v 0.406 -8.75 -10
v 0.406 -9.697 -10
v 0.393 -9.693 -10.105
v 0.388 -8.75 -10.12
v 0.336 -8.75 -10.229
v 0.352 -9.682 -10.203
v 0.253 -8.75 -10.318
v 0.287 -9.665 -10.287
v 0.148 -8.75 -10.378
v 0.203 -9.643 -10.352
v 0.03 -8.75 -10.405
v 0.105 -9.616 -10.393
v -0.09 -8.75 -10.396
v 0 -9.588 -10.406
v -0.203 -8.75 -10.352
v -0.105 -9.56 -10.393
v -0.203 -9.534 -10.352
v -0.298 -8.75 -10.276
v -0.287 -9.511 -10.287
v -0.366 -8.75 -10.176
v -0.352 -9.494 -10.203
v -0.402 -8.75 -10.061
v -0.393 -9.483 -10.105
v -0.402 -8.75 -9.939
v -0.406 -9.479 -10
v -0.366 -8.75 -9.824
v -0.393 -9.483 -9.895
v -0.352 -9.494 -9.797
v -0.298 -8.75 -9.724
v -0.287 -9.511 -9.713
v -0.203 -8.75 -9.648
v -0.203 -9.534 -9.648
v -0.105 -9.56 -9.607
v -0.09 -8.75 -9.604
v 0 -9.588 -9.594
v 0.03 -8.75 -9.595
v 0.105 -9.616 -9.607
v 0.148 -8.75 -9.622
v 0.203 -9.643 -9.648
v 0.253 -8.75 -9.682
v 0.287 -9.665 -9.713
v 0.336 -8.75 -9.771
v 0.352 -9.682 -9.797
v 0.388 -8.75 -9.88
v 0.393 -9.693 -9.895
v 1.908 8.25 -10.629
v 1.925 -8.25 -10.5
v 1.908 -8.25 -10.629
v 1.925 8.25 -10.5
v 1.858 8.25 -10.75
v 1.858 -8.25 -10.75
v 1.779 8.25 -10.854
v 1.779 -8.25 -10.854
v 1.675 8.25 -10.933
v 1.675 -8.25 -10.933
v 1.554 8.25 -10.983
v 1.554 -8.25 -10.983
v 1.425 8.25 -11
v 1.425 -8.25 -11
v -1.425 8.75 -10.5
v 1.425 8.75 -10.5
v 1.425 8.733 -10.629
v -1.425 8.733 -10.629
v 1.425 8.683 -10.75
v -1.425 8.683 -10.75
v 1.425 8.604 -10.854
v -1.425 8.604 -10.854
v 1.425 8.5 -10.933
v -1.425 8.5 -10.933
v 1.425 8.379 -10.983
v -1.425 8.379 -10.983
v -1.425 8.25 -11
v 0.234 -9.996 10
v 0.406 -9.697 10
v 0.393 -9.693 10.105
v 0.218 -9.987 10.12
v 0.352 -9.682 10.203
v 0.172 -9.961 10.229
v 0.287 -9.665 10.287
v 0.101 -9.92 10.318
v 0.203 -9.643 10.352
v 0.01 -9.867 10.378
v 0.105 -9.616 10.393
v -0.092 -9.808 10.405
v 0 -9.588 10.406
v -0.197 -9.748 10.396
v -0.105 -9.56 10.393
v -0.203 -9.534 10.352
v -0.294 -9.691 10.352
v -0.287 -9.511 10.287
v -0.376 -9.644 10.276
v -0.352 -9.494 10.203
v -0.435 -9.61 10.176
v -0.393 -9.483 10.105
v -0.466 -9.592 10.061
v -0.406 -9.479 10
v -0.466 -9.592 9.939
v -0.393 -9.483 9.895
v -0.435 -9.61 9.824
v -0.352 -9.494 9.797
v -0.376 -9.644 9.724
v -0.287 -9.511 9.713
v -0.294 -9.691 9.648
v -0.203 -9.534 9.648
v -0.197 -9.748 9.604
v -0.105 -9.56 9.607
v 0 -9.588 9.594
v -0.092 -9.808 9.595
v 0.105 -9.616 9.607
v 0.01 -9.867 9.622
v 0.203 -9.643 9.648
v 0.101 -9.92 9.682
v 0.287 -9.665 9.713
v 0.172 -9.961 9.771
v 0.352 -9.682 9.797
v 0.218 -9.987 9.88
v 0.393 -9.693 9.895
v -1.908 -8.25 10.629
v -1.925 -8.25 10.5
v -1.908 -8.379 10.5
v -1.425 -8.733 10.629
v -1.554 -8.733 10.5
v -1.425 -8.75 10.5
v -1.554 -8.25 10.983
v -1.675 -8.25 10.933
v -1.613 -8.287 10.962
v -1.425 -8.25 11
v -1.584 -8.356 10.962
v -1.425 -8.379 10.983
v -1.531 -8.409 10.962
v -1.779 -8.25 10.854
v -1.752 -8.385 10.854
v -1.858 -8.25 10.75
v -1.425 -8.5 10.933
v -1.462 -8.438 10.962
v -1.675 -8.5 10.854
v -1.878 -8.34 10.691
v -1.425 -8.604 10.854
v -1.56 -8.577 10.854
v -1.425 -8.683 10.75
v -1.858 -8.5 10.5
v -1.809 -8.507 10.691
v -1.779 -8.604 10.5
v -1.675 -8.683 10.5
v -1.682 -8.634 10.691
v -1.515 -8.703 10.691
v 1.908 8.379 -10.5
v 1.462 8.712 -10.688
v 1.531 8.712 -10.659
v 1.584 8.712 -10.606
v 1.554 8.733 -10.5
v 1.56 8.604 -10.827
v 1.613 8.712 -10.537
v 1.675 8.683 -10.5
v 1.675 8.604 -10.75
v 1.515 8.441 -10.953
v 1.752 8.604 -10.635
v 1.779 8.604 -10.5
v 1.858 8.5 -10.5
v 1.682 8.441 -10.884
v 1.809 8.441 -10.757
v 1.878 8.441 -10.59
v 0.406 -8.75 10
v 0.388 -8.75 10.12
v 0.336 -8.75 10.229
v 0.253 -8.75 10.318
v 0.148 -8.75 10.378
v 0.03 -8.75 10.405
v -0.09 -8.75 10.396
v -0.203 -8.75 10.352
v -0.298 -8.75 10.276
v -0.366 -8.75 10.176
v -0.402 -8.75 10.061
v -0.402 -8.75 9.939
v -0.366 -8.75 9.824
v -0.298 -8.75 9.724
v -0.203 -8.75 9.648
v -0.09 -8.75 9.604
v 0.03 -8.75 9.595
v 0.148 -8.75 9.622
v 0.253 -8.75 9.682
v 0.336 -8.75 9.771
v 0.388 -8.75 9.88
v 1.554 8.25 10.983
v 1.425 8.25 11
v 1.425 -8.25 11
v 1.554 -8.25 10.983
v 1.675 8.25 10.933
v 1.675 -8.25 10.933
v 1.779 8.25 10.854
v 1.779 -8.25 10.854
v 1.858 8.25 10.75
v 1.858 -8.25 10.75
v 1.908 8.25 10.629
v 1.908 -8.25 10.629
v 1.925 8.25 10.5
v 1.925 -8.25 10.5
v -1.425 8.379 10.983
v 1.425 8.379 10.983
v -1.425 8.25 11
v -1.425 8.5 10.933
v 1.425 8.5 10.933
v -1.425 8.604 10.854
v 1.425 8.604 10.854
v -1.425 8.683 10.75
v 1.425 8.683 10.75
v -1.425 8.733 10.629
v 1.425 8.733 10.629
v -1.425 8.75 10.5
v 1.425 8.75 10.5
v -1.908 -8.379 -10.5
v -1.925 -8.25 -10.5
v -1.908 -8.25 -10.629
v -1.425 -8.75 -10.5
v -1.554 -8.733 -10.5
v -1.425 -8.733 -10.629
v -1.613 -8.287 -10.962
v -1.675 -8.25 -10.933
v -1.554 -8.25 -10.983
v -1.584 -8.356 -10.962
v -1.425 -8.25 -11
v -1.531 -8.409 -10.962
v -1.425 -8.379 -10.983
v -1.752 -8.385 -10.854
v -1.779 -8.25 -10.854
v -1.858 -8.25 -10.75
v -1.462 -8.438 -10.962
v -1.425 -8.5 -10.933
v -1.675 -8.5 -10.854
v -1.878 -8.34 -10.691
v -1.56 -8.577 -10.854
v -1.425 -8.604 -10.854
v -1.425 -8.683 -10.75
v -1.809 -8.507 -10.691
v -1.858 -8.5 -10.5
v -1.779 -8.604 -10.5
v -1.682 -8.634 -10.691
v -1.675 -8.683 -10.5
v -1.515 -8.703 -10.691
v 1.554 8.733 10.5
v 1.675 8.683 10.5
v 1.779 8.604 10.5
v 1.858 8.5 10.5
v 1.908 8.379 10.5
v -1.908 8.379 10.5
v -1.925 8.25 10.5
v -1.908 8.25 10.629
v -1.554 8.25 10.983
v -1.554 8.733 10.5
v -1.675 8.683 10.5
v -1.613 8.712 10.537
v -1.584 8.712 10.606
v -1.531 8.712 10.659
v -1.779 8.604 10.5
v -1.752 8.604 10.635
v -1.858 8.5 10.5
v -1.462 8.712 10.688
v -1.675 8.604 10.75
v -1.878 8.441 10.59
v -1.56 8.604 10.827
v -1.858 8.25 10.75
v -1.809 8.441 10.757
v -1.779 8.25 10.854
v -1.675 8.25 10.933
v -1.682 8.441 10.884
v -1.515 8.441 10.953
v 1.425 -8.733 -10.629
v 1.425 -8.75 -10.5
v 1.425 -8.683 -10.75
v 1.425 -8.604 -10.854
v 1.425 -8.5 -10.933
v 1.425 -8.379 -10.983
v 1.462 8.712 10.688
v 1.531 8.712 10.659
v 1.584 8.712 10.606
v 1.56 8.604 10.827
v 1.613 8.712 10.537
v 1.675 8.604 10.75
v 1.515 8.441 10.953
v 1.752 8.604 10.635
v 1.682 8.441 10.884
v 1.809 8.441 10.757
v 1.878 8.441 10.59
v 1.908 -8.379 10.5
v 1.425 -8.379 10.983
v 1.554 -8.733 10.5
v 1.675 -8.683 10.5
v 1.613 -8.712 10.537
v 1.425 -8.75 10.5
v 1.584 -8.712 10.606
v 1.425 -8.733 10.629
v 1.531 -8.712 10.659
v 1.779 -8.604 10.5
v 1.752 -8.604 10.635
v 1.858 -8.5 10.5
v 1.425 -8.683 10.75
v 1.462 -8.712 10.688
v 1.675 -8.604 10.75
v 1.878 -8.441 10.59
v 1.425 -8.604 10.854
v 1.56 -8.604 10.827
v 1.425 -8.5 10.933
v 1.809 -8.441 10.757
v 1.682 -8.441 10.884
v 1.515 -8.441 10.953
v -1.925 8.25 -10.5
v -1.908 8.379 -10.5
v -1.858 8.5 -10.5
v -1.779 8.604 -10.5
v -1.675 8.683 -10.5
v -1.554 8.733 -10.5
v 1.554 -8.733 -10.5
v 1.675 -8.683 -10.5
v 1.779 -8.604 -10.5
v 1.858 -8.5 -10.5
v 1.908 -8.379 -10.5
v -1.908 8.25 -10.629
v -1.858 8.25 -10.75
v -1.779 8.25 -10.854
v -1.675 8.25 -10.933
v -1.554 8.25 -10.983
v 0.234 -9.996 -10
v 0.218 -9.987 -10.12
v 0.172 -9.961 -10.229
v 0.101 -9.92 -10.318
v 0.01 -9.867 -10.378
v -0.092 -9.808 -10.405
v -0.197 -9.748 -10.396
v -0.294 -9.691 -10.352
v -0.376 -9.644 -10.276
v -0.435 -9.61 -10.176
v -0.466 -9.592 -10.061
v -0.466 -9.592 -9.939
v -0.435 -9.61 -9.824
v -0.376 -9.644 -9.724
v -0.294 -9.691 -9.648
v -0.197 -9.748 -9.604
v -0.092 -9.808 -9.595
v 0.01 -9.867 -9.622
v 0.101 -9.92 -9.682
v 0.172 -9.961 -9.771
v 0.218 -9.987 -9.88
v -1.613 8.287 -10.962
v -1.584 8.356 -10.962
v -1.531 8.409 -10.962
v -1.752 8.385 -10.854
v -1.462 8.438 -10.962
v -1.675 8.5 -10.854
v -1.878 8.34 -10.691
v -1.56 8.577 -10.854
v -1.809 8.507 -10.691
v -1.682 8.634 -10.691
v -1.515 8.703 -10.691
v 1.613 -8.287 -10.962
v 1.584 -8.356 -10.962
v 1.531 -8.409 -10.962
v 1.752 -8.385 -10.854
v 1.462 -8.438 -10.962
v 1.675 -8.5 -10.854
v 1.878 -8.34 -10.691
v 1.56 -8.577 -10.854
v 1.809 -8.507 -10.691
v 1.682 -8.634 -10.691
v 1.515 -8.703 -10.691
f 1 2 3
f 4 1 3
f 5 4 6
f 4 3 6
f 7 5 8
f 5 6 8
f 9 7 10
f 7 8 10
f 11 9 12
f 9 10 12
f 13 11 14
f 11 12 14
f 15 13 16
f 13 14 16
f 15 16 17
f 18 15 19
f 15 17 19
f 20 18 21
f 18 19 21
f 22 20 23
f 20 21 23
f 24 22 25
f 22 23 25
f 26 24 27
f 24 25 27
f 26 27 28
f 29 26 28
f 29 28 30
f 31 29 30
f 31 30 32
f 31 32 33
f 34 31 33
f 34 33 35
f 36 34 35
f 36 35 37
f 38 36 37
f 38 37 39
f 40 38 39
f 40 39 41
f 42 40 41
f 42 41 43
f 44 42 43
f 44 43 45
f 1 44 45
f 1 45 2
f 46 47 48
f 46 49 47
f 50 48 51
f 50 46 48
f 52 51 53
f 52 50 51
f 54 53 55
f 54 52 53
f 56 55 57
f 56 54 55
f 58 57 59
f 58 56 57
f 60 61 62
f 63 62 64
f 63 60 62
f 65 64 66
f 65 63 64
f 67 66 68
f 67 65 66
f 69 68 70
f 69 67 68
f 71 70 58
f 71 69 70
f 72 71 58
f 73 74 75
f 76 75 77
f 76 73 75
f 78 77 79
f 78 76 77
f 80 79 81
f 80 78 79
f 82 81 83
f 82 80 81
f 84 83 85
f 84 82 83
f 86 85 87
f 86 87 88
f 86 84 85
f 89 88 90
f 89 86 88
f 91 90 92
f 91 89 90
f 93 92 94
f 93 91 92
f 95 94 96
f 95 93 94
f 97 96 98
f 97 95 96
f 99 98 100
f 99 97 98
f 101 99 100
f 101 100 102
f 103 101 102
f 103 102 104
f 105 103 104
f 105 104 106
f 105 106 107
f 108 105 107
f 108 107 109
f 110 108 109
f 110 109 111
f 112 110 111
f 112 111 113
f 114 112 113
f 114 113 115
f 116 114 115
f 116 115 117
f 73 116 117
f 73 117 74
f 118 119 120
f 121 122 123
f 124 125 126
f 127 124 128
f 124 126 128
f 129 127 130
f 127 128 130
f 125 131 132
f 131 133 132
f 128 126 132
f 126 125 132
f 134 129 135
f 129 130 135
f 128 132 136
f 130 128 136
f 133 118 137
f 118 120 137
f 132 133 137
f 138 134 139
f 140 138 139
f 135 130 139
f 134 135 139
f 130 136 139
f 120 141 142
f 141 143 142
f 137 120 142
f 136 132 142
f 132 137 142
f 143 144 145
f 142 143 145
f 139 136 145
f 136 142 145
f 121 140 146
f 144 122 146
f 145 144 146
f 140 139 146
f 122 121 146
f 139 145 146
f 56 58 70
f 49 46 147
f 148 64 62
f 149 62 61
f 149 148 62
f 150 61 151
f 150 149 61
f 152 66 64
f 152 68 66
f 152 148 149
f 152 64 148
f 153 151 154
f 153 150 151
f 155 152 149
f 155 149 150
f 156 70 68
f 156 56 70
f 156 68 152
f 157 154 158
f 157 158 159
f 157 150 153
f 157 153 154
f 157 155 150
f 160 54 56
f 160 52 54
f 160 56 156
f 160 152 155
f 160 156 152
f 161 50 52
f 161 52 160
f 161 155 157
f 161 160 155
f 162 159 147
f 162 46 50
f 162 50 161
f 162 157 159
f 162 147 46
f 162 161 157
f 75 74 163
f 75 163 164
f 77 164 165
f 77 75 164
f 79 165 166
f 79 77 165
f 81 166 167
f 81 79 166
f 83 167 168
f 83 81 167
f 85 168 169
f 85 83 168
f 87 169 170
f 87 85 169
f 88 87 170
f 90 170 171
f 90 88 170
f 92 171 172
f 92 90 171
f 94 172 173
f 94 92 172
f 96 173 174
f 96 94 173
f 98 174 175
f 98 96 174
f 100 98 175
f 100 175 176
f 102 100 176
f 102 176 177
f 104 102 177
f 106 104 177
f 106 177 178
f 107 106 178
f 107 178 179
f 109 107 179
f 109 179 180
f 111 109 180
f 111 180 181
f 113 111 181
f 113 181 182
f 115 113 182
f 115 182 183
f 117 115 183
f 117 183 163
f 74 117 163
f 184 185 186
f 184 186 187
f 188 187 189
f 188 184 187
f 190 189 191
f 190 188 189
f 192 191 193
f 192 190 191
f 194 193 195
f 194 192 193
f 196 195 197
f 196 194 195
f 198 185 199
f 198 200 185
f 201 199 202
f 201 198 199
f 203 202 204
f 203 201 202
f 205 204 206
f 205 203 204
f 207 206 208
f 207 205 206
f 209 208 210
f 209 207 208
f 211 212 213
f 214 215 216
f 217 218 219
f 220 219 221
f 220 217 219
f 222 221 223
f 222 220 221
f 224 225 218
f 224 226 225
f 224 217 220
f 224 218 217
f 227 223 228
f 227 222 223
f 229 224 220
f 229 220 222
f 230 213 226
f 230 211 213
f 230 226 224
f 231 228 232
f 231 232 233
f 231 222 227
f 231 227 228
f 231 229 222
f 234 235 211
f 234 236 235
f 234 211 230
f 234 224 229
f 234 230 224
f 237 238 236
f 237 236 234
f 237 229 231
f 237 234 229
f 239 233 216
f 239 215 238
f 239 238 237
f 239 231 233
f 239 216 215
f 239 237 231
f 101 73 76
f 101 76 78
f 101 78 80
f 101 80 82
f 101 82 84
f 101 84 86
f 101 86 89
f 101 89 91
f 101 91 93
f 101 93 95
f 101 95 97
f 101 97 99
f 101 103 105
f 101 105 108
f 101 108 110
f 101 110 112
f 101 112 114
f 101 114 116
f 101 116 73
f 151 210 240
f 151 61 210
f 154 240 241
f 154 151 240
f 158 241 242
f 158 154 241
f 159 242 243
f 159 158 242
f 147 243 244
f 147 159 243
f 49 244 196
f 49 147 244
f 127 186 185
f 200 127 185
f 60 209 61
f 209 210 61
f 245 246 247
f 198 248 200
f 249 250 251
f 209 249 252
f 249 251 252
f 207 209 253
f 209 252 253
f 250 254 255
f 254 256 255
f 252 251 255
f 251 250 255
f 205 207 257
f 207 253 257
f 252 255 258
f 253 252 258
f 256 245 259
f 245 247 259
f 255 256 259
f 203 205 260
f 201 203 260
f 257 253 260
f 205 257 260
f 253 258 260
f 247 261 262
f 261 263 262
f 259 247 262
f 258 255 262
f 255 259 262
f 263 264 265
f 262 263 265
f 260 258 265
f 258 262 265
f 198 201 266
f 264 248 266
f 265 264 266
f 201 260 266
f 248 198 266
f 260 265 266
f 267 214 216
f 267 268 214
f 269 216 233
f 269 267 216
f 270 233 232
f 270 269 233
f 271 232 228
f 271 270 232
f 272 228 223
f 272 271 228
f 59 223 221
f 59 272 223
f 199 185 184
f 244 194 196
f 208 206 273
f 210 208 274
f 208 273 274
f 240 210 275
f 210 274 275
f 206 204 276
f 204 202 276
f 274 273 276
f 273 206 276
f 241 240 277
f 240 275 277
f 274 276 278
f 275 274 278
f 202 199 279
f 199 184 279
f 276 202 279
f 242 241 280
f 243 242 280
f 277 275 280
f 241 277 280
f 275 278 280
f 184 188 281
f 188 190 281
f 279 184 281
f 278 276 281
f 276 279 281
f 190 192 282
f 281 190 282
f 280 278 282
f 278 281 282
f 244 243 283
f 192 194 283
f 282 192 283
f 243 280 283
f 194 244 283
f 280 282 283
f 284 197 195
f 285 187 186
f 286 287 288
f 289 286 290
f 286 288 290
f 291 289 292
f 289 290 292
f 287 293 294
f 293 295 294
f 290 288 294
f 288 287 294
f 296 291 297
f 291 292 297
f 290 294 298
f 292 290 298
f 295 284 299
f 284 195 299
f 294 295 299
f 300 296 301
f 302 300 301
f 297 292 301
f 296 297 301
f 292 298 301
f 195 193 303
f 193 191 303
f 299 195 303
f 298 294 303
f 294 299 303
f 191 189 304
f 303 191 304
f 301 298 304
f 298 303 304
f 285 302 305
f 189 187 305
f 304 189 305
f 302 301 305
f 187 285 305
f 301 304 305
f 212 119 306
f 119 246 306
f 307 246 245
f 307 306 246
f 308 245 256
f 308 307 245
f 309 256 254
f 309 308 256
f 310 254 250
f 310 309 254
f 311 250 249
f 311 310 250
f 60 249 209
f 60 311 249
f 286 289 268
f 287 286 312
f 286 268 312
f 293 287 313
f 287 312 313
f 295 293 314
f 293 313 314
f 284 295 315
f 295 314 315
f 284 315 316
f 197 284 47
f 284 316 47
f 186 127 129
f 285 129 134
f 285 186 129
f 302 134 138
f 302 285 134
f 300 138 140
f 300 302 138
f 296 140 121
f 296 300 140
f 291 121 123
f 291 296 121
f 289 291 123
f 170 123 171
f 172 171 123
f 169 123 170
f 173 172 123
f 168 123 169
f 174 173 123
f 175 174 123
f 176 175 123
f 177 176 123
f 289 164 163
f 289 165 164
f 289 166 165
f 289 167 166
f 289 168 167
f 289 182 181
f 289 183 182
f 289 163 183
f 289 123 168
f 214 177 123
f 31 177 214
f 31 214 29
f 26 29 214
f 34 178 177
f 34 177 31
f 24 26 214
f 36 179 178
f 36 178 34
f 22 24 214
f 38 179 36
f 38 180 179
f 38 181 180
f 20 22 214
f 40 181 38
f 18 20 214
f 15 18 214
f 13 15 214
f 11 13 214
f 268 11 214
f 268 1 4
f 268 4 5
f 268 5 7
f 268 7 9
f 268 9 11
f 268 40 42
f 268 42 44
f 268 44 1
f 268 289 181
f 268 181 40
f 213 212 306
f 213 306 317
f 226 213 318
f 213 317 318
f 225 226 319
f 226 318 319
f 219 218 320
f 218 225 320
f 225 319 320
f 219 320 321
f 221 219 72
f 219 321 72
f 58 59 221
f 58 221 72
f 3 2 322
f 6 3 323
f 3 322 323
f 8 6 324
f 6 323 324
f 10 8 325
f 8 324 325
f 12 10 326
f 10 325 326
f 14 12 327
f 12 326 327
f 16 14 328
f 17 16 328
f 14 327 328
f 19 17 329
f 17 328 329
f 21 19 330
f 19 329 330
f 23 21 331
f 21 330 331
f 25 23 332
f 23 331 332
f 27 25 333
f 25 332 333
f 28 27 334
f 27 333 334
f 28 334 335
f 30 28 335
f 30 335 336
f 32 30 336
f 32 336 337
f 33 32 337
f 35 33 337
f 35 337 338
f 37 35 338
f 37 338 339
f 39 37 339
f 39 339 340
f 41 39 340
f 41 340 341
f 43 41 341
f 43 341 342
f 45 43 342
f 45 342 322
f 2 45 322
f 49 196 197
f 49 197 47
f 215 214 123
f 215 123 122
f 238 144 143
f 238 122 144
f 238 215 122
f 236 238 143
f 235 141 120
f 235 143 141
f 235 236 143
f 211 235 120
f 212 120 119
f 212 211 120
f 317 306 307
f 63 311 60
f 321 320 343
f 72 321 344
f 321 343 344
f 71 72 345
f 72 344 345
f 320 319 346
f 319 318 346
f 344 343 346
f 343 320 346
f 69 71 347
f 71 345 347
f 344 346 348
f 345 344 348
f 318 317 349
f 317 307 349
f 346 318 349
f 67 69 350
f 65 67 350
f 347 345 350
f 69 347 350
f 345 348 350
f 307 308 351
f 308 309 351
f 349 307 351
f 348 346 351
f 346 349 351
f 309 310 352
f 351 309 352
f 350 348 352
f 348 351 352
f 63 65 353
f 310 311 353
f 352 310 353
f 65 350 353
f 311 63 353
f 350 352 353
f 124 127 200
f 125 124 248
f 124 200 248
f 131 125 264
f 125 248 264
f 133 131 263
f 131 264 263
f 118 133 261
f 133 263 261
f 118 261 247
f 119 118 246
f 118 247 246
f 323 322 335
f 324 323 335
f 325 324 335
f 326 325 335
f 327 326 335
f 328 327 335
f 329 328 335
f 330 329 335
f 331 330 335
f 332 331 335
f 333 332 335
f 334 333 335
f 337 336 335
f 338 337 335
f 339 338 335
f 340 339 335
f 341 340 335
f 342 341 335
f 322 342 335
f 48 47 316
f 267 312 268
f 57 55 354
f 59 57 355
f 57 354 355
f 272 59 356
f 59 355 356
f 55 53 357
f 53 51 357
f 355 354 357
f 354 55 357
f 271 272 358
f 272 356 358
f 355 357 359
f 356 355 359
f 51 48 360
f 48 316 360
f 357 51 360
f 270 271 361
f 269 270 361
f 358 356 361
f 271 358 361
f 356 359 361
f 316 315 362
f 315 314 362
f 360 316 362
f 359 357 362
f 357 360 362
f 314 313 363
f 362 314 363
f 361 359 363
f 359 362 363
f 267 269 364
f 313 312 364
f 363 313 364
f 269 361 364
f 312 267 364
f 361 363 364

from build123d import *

# Parameters (mm, degrees)
SKETCH1_W           = 22
SKETCH1_H           = 17.5
BOSS_EXTRUDE1_DEPTH = 1.925
SKETCH2_R           = 0.4064
FILLET1_R           = 0.5


with BuildPart() as part:
    # Sketch1 → Boss-Extrude1 (new, symmetric)
    with BuildSketch(Plane(origin=(0, 0, 0), x_dir=(0, 0, -1), z_dir=(1, 0, 0))):
        Rectangle(SKETCH1_W, SKETCH1_H)
    extrude(amount=BOSS_EXTRUDE1_DEPTH, both=True)

    # Sweep1: sweep along a path in Sketch3
    with BuildLine(Plane.XY.offset(10)) as sweep1_path:
        Line((0, -8.75), (0, -9.588170614))
        Line((0, -9.588170614), (-0.118311478, -9.793092105))
    # Sketch2 → Sweep1 (sweep)
    with BuildSketch(Plane.XZ.offset(8.75)):
        with Locations((0, 10)):
            Circle(SKETCH2_R)
    sweep1 = sweep(path=sweep1_path.line, transition=Transition.RIGHT)

    # Fillet1
    fillet1_edges = [part.edges().sort_by_distance(p)[0] for p in [
        (1.925, 0, 11),
        (1.925, -8.75, 0),
        (1.925, 0, -11),
        (-1.925, -8.75, 0),
        (-1.925, 0, 11),
        (-1.925, 8.75, 0),
        (-1.925, 0, -11),
        (0, -8.75, -11),
        (0, -8.75, 11),
        (0, 8.75, 11),
        (0, 8.75, -11),
        (1.925, 8.75, 0),
    ]]
    fillet(fillet1_edges, radius=FILLET1_R)

    # Mirror1: Sweep1 across plane
    add(sweep1.mirror(Plane.XY))


solid = part.part
